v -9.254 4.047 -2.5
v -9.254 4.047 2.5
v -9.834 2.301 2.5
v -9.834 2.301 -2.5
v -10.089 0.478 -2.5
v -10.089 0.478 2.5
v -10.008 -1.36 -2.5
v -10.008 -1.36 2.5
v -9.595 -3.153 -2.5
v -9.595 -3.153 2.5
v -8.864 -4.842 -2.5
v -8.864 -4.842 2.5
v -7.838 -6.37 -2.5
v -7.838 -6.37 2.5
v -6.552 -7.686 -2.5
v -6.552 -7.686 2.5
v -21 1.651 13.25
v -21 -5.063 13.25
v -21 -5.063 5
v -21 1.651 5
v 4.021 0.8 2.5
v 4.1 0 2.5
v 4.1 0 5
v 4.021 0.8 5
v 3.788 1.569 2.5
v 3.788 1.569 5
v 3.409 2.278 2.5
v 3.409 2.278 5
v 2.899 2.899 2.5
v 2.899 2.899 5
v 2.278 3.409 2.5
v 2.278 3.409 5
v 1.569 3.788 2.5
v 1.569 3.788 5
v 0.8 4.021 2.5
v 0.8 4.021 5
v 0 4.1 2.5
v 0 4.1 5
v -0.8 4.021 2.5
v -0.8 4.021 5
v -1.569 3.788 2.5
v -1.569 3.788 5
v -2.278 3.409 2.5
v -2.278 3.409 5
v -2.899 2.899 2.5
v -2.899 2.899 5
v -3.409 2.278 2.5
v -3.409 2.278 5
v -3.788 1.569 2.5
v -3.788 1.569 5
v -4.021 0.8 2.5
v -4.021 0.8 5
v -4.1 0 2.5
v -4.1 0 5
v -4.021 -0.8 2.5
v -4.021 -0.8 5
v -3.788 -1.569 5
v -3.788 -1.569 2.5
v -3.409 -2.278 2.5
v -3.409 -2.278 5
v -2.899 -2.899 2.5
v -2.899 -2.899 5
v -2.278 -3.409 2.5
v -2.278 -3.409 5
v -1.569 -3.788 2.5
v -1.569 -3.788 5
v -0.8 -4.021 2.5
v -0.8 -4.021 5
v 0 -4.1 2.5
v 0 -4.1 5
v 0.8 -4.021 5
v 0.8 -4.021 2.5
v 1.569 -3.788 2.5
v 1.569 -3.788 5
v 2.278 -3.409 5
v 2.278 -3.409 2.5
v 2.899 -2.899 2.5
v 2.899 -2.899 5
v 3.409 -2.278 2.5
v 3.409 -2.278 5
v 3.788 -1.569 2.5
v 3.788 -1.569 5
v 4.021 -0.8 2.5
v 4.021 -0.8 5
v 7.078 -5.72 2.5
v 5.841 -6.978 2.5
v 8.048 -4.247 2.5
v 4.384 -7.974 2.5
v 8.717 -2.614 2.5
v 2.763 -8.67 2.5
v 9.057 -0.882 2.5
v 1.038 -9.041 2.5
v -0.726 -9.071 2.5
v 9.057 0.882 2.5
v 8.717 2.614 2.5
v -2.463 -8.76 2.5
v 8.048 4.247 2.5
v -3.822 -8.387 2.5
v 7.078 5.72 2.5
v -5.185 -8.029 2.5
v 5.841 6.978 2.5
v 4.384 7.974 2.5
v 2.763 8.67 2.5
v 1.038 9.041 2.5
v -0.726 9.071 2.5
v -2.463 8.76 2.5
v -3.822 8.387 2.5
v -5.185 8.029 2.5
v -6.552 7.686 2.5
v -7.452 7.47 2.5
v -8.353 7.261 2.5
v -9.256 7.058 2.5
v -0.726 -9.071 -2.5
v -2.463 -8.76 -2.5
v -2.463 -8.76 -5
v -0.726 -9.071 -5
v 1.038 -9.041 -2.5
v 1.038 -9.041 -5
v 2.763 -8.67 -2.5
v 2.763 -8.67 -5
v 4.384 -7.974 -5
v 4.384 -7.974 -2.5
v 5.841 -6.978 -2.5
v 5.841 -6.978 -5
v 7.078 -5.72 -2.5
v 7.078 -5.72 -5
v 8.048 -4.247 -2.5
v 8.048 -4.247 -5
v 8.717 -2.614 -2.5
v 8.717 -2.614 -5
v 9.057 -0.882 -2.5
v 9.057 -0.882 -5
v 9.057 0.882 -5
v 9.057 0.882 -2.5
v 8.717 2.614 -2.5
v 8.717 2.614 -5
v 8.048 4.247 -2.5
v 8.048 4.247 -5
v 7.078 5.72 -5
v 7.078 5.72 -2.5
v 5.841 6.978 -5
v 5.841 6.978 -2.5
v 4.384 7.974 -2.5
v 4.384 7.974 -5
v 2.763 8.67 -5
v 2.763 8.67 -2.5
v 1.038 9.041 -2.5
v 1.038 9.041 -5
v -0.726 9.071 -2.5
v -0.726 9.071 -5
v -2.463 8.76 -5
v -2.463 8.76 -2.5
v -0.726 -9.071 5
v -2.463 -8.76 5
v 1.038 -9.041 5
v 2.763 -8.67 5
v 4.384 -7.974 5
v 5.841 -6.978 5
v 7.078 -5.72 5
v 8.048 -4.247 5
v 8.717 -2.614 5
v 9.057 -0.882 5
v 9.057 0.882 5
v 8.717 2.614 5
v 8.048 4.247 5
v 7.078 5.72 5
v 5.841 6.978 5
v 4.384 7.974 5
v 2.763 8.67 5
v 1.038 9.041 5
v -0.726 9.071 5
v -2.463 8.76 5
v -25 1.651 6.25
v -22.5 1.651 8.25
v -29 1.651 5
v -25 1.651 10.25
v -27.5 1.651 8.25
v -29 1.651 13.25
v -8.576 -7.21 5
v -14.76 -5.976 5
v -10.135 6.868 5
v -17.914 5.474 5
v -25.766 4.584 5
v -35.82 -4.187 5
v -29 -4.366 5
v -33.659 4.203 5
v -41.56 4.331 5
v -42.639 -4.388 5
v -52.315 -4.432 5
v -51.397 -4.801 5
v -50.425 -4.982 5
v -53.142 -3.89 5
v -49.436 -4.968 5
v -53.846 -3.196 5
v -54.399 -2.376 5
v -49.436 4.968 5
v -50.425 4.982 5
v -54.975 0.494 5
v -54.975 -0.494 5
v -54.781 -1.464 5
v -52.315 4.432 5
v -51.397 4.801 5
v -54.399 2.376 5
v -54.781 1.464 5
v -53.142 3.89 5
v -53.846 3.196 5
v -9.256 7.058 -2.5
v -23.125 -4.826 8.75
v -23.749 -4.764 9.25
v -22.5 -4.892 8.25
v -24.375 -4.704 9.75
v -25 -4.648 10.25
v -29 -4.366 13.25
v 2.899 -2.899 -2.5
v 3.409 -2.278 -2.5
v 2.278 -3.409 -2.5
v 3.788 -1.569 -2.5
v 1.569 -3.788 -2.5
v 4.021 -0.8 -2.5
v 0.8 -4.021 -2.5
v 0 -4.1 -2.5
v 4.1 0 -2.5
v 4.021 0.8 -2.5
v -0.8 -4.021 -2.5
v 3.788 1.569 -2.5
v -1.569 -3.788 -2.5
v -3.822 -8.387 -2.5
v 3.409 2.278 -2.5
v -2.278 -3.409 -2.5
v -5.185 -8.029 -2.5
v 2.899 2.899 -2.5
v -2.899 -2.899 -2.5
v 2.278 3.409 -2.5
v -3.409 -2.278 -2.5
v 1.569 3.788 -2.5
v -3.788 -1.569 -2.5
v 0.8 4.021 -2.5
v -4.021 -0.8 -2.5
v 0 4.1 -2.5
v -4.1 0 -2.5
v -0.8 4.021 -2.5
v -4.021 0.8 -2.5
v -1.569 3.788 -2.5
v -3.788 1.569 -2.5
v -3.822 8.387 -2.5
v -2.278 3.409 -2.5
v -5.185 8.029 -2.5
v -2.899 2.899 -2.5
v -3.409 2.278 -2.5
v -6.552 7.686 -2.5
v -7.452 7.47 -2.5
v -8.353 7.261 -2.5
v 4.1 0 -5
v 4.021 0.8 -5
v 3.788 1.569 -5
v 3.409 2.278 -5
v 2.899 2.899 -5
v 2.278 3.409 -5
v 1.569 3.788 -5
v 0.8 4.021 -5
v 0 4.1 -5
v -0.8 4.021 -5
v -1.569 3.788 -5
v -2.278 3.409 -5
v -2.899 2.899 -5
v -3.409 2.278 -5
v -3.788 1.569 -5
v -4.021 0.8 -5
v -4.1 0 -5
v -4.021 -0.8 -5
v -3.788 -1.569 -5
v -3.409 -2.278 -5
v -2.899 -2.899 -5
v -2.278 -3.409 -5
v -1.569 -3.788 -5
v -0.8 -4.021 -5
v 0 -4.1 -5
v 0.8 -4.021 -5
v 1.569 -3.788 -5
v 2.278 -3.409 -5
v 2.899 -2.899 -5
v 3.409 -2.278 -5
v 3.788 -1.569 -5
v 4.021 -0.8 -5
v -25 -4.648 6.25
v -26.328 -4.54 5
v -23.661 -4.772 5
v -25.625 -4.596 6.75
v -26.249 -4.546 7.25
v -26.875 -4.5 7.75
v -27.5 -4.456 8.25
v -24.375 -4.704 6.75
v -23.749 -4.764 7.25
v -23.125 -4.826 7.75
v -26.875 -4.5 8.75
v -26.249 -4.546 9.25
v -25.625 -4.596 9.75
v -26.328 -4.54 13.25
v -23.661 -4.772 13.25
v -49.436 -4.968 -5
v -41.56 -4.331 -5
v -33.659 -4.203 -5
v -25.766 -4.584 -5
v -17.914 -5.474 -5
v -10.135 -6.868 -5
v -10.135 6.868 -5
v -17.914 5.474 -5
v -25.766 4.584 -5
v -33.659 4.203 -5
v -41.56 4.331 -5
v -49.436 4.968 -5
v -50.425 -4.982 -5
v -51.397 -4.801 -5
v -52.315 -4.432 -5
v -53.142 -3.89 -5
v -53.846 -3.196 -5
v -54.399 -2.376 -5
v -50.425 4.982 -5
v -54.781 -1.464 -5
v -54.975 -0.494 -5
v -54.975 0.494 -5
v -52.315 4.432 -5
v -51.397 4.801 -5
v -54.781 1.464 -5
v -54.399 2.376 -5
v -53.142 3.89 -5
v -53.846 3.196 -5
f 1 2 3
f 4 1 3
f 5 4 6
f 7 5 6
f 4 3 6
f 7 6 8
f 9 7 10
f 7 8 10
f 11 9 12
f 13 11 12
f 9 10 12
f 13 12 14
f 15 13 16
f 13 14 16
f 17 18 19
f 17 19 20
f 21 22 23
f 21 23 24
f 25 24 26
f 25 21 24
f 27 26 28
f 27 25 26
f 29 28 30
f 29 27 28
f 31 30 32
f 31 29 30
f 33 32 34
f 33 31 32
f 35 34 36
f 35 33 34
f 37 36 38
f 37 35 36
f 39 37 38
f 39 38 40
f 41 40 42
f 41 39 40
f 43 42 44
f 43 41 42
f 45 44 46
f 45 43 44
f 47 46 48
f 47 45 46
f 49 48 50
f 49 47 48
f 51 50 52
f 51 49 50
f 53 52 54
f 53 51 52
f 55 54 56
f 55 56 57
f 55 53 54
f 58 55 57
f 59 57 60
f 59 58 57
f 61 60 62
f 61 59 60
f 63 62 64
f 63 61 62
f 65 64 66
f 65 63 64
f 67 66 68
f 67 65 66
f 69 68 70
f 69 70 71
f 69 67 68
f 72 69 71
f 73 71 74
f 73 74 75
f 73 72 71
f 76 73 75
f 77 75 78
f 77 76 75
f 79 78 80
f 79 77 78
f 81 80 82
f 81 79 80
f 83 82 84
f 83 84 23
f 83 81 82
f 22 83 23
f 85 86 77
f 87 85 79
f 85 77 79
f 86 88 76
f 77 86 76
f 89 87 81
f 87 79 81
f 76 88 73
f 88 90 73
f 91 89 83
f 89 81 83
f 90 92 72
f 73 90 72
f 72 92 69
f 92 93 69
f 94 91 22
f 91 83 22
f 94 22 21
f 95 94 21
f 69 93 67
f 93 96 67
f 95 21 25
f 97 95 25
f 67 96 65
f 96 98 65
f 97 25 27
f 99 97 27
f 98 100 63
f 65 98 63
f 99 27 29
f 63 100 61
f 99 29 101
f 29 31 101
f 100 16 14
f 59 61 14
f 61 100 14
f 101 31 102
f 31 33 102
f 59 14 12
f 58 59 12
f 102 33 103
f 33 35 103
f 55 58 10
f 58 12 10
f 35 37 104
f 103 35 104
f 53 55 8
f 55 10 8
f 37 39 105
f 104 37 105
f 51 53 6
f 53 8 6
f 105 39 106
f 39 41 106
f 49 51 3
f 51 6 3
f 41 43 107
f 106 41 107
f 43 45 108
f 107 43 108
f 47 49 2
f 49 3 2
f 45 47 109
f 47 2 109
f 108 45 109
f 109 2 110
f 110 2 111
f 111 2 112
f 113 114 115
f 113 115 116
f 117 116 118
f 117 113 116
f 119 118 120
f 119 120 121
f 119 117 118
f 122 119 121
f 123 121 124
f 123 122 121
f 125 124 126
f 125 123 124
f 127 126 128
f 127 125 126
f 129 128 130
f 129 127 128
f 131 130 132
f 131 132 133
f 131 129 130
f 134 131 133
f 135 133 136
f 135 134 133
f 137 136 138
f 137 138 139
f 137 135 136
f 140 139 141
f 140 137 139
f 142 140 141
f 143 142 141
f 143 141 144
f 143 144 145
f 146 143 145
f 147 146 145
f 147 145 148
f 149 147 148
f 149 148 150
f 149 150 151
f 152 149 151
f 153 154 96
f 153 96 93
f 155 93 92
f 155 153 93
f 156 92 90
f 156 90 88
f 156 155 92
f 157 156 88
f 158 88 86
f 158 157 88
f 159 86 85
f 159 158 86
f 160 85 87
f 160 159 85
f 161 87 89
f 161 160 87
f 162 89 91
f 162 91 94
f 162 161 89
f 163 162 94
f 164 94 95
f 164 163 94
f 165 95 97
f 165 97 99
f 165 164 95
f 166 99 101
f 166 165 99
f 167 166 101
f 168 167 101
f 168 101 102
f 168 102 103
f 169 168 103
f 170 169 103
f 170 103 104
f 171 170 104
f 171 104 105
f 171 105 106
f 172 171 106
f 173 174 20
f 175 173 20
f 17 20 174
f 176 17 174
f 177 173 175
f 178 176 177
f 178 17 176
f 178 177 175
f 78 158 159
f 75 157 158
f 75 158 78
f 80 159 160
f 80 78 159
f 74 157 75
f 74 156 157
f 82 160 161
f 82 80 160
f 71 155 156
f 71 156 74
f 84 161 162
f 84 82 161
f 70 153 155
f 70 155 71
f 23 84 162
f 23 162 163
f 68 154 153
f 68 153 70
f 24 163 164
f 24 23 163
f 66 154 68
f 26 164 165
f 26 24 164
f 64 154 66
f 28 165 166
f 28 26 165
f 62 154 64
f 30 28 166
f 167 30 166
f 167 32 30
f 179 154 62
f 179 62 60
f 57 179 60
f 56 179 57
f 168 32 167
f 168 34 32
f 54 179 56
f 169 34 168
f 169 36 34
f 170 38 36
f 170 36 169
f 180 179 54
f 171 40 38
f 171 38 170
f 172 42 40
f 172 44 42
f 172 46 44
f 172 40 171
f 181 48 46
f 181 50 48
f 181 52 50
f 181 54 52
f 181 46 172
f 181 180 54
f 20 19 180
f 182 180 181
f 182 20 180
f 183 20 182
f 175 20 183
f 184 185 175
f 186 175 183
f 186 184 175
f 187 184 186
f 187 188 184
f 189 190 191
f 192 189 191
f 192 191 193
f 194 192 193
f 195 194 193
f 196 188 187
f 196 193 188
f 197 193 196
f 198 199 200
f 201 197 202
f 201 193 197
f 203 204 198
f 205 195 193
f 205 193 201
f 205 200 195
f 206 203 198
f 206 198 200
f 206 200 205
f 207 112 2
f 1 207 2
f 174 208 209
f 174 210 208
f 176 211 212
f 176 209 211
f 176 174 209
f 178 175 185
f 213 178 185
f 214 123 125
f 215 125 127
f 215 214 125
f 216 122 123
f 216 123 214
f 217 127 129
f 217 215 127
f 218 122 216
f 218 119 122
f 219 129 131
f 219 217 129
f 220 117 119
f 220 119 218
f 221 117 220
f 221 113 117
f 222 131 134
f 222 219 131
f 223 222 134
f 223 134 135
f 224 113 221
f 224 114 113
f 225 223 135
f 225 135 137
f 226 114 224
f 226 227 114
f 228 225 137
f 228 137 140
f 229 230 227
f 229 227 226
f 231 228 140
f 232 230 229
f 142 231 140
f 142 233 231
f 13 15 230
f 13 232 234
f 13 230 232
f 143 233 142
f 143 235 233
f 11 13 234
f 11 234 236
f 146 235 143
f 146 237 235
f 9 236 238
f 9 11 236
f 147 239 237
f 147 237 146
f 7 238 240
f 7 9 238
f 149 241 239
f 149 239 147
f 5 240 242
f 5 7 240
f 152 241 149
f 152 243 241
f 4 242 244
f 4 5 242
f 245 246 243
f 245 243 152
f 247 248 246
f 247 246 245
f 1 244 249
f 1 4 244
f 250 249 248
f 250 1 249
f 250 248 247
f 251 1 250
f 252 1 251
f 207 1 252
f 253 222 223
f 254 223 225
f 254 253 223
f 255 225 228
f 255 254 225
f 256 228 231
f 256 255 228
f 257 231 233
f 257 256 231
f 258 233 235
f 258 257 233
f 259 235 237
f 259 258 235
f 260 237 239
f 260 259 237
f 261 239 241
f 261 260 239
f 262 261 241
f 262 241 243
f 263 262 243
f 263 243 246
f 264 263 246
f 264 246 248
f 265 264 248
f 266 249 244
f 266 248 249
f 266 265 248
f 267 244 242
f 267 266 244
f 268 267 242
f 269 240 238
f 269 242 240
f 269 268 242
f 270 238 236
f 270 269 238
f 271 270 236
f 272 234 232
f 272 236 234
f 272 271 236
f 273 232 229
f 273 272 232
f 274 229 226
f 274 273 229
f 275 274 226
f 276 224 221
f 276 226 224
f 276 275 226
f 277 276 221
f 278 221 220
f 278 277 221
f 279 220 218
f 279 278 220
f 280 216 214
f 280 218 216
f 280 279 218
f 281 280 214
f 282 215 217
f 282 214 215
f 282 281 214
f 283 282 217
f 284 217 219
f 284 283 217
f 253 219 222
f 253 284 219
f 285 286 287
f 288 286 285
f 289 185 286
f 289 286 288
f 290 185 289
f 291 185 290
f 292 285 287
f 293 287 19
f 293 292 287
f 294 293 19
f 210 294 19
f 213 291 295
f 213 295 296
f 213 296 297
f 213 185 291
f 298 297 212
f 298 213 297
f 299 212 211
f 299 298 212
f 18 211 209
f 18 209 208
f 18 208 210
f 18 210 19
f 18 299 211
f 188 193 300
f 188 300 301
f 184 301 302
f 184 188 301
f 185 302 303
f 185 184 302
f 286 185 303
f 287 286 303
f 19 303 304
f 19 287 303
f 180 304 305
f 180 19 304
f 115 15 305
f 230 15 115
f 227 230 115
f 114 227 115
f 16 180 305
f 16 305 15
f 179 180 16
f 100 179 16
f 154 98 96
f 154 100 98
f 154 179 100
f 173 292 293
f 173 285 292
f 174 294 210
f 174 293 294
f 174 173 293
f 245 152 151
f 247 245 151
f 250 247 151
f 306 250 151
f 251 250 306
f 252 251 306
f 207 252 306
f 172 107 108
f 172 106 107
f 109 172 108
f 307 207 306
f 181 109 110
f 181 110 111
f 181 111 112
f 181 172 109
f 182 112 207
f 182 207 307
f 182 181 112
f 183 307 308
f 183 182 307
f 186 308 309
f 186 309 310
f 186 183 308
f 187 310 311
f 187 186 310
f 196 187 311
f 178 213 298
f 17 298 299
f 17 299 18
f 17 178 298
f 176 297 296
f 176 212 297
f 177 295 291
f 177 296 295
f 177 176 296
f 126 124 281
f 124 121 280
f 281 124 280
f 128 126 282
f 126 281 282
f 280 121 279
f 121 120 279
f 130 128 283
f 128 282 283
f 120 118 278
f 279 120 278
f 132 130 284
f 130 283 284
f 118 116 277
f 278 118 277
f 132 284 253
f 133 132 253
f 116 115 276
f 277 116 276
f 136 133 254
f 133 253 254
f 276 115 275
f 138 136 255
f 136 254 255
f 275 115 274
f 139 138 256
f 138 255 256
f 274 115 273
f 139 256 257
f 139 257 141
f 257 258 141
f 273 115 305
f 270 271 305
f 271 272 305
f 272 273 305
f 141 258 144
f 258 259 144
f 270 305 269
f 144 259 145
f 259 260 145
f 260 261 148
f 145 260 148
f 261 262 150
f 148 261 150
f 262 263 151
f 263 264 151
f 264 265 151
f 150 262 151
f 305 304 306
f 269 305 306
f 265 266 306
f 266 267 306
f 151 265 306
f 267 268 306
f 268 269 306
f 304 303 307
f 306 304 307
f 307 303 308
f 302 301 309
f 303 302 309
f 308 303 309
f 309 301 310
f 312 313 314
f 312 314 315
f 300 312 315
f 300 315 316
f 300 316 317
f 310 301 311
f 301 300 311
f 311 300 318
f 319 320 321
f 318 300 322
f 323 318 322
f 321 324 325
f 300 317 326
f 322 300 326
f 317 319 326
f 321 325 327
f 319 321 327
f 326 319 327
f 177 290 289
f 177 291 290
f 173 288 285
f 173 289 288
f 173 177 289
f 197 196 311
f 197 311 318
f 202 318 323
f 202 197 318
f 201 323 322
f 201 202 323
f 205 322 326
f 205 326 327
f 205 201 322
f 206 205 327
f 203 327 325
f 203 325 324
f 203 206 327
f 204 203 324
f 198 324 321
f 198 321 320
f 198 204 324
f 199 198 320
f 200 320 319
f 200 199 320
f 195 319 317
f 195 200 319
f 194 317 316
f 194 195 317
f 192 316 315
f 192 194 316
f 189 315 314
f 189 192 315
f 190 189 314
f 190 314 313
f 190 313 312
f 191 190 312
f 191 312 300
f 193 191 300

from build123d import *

# Parameters (mm, degrees)
ESQUISSE1_R             = 4.1
BOSS_EXTRU_1_DEPTH      = 5
ESQUISSE2_R             = 10.1
ENL_V_MAT_EXTRU_1_DEPTH = 2.5
BOSS_EXTRU_2_START      = 8.25
BOSS_EXTRU_2_DEPTH      = 8.25
ENL_V_MAT_EXTRU_2_DEPTH = 58.586020219
CHANFREIN1_START        = -2.5
CHANFREIN1_DEPTH        = 5


with BuildPart() as part:
    # Esquisse1 → Boss.-Extru.1 (new, symmetric)
    with BuildSketch(Plane(origin=(0, 0, 0), x_dir=(0, 1, 0), z_dir=(0, 0, 1))):
        with BuildLine():
            ThreePointArc((-8.760260026, 2.463299468), (0, -9.1), (8.760260026, 2.463299468))
            ThreePointArc((8.760260026, 2.463299468), (4.584088783, 25.765676228), (4.968111267, 49.4362))
            ThreePointArc((4.968111267, 49.4362), (0, 55), (-4.968111267, 49.4362))
            ThreePointArc((-4.968111267, 49.4362), (-4.584088783, 25.765676228), (-8.760260026, 2.463299468))
        make_face()
        with Locations(Location((0, 0, 0), (0, 0, 270))):
            Circle(ESQUISSE1_R, mode=Mode.SUBTRACT)
    extrude(amount=BOSS_EXTRU_1_DEPTH, both=True)

    # Esquisse2 → Enlèv. mat.-Extru.1 (cut, symmetric)
    with BuildSketch(Plane(origin=(0, 0, 0), x_dir=(0, 1, 0), z_dir=(0, 0, 1))):
        Circle(ESQUISSE2_R)
    extrude(amount=ENL_V_MAT_EXTRU_1_DEPTH, both=True, mode=Mode.SUBTRACT)

    # Esquisse3 → Boss.-Extru.2 (add)
    with BuildSketch(Plane.XY.offset(5).offset(BOSS_EXTRU_2_START)):
        with BuildLine():
            Line((-29, 1.651149925), (-29, -4.366011007))
            ThreePointArc((-29, -4.366011007), (-24.994289146, -4.648817083), (-21, -5.062765073))
            Line((-21, -5.062765073), (-21, 1.651149925))
            Line((-21, 1.651149925), (-29, 1.651149925))
        make_face()
    extrude(amount=-BOSS_EXTRU_2_DEPTH)

    # Esquisse4 → Enlèv. mat.-Extru.2 (cut, through all)
    with BuildSketch(Plane(origin=(0, 1.651149925, 0), x_dir=(-1, 0, 0), z_dir=(0, 1, 0))):
        Polygon((22.500084499, 8.25), (25, 10.25), (27.499915501, 8.25), (25, 6.25), align=None)
    extrude(amount=-ENL_V_MAT_EXTRU_2_DEPTH, mode=Mode.SUBTRACT)

    # Chanfrein1: read off the stored shape, not the designer's step
    # Chanfrein1 outline → Chanfrein1 (cut)
    with BuildSketch(Plane.XY.offset(CHANFREIN1_START)):
        with BuildLine():
            ThreePointArc((-6.552176852, 7.68628509), (-7.902187824, 7.364580252), (-9.255756722, 7.058190199))
            Line((-9.255756722, 7.058190199), (-9.253811974, 4.046846174))
            ThreePointArc((-9.253811974, 4.046846174), (-8.109790355, 6.020074784), (-6.552176852, 7.68628509))
        make_face()
    extrude(amount=CHANFREIN1_DEPTH, mode=Mode.SUBTRACT)


solid = part.part
